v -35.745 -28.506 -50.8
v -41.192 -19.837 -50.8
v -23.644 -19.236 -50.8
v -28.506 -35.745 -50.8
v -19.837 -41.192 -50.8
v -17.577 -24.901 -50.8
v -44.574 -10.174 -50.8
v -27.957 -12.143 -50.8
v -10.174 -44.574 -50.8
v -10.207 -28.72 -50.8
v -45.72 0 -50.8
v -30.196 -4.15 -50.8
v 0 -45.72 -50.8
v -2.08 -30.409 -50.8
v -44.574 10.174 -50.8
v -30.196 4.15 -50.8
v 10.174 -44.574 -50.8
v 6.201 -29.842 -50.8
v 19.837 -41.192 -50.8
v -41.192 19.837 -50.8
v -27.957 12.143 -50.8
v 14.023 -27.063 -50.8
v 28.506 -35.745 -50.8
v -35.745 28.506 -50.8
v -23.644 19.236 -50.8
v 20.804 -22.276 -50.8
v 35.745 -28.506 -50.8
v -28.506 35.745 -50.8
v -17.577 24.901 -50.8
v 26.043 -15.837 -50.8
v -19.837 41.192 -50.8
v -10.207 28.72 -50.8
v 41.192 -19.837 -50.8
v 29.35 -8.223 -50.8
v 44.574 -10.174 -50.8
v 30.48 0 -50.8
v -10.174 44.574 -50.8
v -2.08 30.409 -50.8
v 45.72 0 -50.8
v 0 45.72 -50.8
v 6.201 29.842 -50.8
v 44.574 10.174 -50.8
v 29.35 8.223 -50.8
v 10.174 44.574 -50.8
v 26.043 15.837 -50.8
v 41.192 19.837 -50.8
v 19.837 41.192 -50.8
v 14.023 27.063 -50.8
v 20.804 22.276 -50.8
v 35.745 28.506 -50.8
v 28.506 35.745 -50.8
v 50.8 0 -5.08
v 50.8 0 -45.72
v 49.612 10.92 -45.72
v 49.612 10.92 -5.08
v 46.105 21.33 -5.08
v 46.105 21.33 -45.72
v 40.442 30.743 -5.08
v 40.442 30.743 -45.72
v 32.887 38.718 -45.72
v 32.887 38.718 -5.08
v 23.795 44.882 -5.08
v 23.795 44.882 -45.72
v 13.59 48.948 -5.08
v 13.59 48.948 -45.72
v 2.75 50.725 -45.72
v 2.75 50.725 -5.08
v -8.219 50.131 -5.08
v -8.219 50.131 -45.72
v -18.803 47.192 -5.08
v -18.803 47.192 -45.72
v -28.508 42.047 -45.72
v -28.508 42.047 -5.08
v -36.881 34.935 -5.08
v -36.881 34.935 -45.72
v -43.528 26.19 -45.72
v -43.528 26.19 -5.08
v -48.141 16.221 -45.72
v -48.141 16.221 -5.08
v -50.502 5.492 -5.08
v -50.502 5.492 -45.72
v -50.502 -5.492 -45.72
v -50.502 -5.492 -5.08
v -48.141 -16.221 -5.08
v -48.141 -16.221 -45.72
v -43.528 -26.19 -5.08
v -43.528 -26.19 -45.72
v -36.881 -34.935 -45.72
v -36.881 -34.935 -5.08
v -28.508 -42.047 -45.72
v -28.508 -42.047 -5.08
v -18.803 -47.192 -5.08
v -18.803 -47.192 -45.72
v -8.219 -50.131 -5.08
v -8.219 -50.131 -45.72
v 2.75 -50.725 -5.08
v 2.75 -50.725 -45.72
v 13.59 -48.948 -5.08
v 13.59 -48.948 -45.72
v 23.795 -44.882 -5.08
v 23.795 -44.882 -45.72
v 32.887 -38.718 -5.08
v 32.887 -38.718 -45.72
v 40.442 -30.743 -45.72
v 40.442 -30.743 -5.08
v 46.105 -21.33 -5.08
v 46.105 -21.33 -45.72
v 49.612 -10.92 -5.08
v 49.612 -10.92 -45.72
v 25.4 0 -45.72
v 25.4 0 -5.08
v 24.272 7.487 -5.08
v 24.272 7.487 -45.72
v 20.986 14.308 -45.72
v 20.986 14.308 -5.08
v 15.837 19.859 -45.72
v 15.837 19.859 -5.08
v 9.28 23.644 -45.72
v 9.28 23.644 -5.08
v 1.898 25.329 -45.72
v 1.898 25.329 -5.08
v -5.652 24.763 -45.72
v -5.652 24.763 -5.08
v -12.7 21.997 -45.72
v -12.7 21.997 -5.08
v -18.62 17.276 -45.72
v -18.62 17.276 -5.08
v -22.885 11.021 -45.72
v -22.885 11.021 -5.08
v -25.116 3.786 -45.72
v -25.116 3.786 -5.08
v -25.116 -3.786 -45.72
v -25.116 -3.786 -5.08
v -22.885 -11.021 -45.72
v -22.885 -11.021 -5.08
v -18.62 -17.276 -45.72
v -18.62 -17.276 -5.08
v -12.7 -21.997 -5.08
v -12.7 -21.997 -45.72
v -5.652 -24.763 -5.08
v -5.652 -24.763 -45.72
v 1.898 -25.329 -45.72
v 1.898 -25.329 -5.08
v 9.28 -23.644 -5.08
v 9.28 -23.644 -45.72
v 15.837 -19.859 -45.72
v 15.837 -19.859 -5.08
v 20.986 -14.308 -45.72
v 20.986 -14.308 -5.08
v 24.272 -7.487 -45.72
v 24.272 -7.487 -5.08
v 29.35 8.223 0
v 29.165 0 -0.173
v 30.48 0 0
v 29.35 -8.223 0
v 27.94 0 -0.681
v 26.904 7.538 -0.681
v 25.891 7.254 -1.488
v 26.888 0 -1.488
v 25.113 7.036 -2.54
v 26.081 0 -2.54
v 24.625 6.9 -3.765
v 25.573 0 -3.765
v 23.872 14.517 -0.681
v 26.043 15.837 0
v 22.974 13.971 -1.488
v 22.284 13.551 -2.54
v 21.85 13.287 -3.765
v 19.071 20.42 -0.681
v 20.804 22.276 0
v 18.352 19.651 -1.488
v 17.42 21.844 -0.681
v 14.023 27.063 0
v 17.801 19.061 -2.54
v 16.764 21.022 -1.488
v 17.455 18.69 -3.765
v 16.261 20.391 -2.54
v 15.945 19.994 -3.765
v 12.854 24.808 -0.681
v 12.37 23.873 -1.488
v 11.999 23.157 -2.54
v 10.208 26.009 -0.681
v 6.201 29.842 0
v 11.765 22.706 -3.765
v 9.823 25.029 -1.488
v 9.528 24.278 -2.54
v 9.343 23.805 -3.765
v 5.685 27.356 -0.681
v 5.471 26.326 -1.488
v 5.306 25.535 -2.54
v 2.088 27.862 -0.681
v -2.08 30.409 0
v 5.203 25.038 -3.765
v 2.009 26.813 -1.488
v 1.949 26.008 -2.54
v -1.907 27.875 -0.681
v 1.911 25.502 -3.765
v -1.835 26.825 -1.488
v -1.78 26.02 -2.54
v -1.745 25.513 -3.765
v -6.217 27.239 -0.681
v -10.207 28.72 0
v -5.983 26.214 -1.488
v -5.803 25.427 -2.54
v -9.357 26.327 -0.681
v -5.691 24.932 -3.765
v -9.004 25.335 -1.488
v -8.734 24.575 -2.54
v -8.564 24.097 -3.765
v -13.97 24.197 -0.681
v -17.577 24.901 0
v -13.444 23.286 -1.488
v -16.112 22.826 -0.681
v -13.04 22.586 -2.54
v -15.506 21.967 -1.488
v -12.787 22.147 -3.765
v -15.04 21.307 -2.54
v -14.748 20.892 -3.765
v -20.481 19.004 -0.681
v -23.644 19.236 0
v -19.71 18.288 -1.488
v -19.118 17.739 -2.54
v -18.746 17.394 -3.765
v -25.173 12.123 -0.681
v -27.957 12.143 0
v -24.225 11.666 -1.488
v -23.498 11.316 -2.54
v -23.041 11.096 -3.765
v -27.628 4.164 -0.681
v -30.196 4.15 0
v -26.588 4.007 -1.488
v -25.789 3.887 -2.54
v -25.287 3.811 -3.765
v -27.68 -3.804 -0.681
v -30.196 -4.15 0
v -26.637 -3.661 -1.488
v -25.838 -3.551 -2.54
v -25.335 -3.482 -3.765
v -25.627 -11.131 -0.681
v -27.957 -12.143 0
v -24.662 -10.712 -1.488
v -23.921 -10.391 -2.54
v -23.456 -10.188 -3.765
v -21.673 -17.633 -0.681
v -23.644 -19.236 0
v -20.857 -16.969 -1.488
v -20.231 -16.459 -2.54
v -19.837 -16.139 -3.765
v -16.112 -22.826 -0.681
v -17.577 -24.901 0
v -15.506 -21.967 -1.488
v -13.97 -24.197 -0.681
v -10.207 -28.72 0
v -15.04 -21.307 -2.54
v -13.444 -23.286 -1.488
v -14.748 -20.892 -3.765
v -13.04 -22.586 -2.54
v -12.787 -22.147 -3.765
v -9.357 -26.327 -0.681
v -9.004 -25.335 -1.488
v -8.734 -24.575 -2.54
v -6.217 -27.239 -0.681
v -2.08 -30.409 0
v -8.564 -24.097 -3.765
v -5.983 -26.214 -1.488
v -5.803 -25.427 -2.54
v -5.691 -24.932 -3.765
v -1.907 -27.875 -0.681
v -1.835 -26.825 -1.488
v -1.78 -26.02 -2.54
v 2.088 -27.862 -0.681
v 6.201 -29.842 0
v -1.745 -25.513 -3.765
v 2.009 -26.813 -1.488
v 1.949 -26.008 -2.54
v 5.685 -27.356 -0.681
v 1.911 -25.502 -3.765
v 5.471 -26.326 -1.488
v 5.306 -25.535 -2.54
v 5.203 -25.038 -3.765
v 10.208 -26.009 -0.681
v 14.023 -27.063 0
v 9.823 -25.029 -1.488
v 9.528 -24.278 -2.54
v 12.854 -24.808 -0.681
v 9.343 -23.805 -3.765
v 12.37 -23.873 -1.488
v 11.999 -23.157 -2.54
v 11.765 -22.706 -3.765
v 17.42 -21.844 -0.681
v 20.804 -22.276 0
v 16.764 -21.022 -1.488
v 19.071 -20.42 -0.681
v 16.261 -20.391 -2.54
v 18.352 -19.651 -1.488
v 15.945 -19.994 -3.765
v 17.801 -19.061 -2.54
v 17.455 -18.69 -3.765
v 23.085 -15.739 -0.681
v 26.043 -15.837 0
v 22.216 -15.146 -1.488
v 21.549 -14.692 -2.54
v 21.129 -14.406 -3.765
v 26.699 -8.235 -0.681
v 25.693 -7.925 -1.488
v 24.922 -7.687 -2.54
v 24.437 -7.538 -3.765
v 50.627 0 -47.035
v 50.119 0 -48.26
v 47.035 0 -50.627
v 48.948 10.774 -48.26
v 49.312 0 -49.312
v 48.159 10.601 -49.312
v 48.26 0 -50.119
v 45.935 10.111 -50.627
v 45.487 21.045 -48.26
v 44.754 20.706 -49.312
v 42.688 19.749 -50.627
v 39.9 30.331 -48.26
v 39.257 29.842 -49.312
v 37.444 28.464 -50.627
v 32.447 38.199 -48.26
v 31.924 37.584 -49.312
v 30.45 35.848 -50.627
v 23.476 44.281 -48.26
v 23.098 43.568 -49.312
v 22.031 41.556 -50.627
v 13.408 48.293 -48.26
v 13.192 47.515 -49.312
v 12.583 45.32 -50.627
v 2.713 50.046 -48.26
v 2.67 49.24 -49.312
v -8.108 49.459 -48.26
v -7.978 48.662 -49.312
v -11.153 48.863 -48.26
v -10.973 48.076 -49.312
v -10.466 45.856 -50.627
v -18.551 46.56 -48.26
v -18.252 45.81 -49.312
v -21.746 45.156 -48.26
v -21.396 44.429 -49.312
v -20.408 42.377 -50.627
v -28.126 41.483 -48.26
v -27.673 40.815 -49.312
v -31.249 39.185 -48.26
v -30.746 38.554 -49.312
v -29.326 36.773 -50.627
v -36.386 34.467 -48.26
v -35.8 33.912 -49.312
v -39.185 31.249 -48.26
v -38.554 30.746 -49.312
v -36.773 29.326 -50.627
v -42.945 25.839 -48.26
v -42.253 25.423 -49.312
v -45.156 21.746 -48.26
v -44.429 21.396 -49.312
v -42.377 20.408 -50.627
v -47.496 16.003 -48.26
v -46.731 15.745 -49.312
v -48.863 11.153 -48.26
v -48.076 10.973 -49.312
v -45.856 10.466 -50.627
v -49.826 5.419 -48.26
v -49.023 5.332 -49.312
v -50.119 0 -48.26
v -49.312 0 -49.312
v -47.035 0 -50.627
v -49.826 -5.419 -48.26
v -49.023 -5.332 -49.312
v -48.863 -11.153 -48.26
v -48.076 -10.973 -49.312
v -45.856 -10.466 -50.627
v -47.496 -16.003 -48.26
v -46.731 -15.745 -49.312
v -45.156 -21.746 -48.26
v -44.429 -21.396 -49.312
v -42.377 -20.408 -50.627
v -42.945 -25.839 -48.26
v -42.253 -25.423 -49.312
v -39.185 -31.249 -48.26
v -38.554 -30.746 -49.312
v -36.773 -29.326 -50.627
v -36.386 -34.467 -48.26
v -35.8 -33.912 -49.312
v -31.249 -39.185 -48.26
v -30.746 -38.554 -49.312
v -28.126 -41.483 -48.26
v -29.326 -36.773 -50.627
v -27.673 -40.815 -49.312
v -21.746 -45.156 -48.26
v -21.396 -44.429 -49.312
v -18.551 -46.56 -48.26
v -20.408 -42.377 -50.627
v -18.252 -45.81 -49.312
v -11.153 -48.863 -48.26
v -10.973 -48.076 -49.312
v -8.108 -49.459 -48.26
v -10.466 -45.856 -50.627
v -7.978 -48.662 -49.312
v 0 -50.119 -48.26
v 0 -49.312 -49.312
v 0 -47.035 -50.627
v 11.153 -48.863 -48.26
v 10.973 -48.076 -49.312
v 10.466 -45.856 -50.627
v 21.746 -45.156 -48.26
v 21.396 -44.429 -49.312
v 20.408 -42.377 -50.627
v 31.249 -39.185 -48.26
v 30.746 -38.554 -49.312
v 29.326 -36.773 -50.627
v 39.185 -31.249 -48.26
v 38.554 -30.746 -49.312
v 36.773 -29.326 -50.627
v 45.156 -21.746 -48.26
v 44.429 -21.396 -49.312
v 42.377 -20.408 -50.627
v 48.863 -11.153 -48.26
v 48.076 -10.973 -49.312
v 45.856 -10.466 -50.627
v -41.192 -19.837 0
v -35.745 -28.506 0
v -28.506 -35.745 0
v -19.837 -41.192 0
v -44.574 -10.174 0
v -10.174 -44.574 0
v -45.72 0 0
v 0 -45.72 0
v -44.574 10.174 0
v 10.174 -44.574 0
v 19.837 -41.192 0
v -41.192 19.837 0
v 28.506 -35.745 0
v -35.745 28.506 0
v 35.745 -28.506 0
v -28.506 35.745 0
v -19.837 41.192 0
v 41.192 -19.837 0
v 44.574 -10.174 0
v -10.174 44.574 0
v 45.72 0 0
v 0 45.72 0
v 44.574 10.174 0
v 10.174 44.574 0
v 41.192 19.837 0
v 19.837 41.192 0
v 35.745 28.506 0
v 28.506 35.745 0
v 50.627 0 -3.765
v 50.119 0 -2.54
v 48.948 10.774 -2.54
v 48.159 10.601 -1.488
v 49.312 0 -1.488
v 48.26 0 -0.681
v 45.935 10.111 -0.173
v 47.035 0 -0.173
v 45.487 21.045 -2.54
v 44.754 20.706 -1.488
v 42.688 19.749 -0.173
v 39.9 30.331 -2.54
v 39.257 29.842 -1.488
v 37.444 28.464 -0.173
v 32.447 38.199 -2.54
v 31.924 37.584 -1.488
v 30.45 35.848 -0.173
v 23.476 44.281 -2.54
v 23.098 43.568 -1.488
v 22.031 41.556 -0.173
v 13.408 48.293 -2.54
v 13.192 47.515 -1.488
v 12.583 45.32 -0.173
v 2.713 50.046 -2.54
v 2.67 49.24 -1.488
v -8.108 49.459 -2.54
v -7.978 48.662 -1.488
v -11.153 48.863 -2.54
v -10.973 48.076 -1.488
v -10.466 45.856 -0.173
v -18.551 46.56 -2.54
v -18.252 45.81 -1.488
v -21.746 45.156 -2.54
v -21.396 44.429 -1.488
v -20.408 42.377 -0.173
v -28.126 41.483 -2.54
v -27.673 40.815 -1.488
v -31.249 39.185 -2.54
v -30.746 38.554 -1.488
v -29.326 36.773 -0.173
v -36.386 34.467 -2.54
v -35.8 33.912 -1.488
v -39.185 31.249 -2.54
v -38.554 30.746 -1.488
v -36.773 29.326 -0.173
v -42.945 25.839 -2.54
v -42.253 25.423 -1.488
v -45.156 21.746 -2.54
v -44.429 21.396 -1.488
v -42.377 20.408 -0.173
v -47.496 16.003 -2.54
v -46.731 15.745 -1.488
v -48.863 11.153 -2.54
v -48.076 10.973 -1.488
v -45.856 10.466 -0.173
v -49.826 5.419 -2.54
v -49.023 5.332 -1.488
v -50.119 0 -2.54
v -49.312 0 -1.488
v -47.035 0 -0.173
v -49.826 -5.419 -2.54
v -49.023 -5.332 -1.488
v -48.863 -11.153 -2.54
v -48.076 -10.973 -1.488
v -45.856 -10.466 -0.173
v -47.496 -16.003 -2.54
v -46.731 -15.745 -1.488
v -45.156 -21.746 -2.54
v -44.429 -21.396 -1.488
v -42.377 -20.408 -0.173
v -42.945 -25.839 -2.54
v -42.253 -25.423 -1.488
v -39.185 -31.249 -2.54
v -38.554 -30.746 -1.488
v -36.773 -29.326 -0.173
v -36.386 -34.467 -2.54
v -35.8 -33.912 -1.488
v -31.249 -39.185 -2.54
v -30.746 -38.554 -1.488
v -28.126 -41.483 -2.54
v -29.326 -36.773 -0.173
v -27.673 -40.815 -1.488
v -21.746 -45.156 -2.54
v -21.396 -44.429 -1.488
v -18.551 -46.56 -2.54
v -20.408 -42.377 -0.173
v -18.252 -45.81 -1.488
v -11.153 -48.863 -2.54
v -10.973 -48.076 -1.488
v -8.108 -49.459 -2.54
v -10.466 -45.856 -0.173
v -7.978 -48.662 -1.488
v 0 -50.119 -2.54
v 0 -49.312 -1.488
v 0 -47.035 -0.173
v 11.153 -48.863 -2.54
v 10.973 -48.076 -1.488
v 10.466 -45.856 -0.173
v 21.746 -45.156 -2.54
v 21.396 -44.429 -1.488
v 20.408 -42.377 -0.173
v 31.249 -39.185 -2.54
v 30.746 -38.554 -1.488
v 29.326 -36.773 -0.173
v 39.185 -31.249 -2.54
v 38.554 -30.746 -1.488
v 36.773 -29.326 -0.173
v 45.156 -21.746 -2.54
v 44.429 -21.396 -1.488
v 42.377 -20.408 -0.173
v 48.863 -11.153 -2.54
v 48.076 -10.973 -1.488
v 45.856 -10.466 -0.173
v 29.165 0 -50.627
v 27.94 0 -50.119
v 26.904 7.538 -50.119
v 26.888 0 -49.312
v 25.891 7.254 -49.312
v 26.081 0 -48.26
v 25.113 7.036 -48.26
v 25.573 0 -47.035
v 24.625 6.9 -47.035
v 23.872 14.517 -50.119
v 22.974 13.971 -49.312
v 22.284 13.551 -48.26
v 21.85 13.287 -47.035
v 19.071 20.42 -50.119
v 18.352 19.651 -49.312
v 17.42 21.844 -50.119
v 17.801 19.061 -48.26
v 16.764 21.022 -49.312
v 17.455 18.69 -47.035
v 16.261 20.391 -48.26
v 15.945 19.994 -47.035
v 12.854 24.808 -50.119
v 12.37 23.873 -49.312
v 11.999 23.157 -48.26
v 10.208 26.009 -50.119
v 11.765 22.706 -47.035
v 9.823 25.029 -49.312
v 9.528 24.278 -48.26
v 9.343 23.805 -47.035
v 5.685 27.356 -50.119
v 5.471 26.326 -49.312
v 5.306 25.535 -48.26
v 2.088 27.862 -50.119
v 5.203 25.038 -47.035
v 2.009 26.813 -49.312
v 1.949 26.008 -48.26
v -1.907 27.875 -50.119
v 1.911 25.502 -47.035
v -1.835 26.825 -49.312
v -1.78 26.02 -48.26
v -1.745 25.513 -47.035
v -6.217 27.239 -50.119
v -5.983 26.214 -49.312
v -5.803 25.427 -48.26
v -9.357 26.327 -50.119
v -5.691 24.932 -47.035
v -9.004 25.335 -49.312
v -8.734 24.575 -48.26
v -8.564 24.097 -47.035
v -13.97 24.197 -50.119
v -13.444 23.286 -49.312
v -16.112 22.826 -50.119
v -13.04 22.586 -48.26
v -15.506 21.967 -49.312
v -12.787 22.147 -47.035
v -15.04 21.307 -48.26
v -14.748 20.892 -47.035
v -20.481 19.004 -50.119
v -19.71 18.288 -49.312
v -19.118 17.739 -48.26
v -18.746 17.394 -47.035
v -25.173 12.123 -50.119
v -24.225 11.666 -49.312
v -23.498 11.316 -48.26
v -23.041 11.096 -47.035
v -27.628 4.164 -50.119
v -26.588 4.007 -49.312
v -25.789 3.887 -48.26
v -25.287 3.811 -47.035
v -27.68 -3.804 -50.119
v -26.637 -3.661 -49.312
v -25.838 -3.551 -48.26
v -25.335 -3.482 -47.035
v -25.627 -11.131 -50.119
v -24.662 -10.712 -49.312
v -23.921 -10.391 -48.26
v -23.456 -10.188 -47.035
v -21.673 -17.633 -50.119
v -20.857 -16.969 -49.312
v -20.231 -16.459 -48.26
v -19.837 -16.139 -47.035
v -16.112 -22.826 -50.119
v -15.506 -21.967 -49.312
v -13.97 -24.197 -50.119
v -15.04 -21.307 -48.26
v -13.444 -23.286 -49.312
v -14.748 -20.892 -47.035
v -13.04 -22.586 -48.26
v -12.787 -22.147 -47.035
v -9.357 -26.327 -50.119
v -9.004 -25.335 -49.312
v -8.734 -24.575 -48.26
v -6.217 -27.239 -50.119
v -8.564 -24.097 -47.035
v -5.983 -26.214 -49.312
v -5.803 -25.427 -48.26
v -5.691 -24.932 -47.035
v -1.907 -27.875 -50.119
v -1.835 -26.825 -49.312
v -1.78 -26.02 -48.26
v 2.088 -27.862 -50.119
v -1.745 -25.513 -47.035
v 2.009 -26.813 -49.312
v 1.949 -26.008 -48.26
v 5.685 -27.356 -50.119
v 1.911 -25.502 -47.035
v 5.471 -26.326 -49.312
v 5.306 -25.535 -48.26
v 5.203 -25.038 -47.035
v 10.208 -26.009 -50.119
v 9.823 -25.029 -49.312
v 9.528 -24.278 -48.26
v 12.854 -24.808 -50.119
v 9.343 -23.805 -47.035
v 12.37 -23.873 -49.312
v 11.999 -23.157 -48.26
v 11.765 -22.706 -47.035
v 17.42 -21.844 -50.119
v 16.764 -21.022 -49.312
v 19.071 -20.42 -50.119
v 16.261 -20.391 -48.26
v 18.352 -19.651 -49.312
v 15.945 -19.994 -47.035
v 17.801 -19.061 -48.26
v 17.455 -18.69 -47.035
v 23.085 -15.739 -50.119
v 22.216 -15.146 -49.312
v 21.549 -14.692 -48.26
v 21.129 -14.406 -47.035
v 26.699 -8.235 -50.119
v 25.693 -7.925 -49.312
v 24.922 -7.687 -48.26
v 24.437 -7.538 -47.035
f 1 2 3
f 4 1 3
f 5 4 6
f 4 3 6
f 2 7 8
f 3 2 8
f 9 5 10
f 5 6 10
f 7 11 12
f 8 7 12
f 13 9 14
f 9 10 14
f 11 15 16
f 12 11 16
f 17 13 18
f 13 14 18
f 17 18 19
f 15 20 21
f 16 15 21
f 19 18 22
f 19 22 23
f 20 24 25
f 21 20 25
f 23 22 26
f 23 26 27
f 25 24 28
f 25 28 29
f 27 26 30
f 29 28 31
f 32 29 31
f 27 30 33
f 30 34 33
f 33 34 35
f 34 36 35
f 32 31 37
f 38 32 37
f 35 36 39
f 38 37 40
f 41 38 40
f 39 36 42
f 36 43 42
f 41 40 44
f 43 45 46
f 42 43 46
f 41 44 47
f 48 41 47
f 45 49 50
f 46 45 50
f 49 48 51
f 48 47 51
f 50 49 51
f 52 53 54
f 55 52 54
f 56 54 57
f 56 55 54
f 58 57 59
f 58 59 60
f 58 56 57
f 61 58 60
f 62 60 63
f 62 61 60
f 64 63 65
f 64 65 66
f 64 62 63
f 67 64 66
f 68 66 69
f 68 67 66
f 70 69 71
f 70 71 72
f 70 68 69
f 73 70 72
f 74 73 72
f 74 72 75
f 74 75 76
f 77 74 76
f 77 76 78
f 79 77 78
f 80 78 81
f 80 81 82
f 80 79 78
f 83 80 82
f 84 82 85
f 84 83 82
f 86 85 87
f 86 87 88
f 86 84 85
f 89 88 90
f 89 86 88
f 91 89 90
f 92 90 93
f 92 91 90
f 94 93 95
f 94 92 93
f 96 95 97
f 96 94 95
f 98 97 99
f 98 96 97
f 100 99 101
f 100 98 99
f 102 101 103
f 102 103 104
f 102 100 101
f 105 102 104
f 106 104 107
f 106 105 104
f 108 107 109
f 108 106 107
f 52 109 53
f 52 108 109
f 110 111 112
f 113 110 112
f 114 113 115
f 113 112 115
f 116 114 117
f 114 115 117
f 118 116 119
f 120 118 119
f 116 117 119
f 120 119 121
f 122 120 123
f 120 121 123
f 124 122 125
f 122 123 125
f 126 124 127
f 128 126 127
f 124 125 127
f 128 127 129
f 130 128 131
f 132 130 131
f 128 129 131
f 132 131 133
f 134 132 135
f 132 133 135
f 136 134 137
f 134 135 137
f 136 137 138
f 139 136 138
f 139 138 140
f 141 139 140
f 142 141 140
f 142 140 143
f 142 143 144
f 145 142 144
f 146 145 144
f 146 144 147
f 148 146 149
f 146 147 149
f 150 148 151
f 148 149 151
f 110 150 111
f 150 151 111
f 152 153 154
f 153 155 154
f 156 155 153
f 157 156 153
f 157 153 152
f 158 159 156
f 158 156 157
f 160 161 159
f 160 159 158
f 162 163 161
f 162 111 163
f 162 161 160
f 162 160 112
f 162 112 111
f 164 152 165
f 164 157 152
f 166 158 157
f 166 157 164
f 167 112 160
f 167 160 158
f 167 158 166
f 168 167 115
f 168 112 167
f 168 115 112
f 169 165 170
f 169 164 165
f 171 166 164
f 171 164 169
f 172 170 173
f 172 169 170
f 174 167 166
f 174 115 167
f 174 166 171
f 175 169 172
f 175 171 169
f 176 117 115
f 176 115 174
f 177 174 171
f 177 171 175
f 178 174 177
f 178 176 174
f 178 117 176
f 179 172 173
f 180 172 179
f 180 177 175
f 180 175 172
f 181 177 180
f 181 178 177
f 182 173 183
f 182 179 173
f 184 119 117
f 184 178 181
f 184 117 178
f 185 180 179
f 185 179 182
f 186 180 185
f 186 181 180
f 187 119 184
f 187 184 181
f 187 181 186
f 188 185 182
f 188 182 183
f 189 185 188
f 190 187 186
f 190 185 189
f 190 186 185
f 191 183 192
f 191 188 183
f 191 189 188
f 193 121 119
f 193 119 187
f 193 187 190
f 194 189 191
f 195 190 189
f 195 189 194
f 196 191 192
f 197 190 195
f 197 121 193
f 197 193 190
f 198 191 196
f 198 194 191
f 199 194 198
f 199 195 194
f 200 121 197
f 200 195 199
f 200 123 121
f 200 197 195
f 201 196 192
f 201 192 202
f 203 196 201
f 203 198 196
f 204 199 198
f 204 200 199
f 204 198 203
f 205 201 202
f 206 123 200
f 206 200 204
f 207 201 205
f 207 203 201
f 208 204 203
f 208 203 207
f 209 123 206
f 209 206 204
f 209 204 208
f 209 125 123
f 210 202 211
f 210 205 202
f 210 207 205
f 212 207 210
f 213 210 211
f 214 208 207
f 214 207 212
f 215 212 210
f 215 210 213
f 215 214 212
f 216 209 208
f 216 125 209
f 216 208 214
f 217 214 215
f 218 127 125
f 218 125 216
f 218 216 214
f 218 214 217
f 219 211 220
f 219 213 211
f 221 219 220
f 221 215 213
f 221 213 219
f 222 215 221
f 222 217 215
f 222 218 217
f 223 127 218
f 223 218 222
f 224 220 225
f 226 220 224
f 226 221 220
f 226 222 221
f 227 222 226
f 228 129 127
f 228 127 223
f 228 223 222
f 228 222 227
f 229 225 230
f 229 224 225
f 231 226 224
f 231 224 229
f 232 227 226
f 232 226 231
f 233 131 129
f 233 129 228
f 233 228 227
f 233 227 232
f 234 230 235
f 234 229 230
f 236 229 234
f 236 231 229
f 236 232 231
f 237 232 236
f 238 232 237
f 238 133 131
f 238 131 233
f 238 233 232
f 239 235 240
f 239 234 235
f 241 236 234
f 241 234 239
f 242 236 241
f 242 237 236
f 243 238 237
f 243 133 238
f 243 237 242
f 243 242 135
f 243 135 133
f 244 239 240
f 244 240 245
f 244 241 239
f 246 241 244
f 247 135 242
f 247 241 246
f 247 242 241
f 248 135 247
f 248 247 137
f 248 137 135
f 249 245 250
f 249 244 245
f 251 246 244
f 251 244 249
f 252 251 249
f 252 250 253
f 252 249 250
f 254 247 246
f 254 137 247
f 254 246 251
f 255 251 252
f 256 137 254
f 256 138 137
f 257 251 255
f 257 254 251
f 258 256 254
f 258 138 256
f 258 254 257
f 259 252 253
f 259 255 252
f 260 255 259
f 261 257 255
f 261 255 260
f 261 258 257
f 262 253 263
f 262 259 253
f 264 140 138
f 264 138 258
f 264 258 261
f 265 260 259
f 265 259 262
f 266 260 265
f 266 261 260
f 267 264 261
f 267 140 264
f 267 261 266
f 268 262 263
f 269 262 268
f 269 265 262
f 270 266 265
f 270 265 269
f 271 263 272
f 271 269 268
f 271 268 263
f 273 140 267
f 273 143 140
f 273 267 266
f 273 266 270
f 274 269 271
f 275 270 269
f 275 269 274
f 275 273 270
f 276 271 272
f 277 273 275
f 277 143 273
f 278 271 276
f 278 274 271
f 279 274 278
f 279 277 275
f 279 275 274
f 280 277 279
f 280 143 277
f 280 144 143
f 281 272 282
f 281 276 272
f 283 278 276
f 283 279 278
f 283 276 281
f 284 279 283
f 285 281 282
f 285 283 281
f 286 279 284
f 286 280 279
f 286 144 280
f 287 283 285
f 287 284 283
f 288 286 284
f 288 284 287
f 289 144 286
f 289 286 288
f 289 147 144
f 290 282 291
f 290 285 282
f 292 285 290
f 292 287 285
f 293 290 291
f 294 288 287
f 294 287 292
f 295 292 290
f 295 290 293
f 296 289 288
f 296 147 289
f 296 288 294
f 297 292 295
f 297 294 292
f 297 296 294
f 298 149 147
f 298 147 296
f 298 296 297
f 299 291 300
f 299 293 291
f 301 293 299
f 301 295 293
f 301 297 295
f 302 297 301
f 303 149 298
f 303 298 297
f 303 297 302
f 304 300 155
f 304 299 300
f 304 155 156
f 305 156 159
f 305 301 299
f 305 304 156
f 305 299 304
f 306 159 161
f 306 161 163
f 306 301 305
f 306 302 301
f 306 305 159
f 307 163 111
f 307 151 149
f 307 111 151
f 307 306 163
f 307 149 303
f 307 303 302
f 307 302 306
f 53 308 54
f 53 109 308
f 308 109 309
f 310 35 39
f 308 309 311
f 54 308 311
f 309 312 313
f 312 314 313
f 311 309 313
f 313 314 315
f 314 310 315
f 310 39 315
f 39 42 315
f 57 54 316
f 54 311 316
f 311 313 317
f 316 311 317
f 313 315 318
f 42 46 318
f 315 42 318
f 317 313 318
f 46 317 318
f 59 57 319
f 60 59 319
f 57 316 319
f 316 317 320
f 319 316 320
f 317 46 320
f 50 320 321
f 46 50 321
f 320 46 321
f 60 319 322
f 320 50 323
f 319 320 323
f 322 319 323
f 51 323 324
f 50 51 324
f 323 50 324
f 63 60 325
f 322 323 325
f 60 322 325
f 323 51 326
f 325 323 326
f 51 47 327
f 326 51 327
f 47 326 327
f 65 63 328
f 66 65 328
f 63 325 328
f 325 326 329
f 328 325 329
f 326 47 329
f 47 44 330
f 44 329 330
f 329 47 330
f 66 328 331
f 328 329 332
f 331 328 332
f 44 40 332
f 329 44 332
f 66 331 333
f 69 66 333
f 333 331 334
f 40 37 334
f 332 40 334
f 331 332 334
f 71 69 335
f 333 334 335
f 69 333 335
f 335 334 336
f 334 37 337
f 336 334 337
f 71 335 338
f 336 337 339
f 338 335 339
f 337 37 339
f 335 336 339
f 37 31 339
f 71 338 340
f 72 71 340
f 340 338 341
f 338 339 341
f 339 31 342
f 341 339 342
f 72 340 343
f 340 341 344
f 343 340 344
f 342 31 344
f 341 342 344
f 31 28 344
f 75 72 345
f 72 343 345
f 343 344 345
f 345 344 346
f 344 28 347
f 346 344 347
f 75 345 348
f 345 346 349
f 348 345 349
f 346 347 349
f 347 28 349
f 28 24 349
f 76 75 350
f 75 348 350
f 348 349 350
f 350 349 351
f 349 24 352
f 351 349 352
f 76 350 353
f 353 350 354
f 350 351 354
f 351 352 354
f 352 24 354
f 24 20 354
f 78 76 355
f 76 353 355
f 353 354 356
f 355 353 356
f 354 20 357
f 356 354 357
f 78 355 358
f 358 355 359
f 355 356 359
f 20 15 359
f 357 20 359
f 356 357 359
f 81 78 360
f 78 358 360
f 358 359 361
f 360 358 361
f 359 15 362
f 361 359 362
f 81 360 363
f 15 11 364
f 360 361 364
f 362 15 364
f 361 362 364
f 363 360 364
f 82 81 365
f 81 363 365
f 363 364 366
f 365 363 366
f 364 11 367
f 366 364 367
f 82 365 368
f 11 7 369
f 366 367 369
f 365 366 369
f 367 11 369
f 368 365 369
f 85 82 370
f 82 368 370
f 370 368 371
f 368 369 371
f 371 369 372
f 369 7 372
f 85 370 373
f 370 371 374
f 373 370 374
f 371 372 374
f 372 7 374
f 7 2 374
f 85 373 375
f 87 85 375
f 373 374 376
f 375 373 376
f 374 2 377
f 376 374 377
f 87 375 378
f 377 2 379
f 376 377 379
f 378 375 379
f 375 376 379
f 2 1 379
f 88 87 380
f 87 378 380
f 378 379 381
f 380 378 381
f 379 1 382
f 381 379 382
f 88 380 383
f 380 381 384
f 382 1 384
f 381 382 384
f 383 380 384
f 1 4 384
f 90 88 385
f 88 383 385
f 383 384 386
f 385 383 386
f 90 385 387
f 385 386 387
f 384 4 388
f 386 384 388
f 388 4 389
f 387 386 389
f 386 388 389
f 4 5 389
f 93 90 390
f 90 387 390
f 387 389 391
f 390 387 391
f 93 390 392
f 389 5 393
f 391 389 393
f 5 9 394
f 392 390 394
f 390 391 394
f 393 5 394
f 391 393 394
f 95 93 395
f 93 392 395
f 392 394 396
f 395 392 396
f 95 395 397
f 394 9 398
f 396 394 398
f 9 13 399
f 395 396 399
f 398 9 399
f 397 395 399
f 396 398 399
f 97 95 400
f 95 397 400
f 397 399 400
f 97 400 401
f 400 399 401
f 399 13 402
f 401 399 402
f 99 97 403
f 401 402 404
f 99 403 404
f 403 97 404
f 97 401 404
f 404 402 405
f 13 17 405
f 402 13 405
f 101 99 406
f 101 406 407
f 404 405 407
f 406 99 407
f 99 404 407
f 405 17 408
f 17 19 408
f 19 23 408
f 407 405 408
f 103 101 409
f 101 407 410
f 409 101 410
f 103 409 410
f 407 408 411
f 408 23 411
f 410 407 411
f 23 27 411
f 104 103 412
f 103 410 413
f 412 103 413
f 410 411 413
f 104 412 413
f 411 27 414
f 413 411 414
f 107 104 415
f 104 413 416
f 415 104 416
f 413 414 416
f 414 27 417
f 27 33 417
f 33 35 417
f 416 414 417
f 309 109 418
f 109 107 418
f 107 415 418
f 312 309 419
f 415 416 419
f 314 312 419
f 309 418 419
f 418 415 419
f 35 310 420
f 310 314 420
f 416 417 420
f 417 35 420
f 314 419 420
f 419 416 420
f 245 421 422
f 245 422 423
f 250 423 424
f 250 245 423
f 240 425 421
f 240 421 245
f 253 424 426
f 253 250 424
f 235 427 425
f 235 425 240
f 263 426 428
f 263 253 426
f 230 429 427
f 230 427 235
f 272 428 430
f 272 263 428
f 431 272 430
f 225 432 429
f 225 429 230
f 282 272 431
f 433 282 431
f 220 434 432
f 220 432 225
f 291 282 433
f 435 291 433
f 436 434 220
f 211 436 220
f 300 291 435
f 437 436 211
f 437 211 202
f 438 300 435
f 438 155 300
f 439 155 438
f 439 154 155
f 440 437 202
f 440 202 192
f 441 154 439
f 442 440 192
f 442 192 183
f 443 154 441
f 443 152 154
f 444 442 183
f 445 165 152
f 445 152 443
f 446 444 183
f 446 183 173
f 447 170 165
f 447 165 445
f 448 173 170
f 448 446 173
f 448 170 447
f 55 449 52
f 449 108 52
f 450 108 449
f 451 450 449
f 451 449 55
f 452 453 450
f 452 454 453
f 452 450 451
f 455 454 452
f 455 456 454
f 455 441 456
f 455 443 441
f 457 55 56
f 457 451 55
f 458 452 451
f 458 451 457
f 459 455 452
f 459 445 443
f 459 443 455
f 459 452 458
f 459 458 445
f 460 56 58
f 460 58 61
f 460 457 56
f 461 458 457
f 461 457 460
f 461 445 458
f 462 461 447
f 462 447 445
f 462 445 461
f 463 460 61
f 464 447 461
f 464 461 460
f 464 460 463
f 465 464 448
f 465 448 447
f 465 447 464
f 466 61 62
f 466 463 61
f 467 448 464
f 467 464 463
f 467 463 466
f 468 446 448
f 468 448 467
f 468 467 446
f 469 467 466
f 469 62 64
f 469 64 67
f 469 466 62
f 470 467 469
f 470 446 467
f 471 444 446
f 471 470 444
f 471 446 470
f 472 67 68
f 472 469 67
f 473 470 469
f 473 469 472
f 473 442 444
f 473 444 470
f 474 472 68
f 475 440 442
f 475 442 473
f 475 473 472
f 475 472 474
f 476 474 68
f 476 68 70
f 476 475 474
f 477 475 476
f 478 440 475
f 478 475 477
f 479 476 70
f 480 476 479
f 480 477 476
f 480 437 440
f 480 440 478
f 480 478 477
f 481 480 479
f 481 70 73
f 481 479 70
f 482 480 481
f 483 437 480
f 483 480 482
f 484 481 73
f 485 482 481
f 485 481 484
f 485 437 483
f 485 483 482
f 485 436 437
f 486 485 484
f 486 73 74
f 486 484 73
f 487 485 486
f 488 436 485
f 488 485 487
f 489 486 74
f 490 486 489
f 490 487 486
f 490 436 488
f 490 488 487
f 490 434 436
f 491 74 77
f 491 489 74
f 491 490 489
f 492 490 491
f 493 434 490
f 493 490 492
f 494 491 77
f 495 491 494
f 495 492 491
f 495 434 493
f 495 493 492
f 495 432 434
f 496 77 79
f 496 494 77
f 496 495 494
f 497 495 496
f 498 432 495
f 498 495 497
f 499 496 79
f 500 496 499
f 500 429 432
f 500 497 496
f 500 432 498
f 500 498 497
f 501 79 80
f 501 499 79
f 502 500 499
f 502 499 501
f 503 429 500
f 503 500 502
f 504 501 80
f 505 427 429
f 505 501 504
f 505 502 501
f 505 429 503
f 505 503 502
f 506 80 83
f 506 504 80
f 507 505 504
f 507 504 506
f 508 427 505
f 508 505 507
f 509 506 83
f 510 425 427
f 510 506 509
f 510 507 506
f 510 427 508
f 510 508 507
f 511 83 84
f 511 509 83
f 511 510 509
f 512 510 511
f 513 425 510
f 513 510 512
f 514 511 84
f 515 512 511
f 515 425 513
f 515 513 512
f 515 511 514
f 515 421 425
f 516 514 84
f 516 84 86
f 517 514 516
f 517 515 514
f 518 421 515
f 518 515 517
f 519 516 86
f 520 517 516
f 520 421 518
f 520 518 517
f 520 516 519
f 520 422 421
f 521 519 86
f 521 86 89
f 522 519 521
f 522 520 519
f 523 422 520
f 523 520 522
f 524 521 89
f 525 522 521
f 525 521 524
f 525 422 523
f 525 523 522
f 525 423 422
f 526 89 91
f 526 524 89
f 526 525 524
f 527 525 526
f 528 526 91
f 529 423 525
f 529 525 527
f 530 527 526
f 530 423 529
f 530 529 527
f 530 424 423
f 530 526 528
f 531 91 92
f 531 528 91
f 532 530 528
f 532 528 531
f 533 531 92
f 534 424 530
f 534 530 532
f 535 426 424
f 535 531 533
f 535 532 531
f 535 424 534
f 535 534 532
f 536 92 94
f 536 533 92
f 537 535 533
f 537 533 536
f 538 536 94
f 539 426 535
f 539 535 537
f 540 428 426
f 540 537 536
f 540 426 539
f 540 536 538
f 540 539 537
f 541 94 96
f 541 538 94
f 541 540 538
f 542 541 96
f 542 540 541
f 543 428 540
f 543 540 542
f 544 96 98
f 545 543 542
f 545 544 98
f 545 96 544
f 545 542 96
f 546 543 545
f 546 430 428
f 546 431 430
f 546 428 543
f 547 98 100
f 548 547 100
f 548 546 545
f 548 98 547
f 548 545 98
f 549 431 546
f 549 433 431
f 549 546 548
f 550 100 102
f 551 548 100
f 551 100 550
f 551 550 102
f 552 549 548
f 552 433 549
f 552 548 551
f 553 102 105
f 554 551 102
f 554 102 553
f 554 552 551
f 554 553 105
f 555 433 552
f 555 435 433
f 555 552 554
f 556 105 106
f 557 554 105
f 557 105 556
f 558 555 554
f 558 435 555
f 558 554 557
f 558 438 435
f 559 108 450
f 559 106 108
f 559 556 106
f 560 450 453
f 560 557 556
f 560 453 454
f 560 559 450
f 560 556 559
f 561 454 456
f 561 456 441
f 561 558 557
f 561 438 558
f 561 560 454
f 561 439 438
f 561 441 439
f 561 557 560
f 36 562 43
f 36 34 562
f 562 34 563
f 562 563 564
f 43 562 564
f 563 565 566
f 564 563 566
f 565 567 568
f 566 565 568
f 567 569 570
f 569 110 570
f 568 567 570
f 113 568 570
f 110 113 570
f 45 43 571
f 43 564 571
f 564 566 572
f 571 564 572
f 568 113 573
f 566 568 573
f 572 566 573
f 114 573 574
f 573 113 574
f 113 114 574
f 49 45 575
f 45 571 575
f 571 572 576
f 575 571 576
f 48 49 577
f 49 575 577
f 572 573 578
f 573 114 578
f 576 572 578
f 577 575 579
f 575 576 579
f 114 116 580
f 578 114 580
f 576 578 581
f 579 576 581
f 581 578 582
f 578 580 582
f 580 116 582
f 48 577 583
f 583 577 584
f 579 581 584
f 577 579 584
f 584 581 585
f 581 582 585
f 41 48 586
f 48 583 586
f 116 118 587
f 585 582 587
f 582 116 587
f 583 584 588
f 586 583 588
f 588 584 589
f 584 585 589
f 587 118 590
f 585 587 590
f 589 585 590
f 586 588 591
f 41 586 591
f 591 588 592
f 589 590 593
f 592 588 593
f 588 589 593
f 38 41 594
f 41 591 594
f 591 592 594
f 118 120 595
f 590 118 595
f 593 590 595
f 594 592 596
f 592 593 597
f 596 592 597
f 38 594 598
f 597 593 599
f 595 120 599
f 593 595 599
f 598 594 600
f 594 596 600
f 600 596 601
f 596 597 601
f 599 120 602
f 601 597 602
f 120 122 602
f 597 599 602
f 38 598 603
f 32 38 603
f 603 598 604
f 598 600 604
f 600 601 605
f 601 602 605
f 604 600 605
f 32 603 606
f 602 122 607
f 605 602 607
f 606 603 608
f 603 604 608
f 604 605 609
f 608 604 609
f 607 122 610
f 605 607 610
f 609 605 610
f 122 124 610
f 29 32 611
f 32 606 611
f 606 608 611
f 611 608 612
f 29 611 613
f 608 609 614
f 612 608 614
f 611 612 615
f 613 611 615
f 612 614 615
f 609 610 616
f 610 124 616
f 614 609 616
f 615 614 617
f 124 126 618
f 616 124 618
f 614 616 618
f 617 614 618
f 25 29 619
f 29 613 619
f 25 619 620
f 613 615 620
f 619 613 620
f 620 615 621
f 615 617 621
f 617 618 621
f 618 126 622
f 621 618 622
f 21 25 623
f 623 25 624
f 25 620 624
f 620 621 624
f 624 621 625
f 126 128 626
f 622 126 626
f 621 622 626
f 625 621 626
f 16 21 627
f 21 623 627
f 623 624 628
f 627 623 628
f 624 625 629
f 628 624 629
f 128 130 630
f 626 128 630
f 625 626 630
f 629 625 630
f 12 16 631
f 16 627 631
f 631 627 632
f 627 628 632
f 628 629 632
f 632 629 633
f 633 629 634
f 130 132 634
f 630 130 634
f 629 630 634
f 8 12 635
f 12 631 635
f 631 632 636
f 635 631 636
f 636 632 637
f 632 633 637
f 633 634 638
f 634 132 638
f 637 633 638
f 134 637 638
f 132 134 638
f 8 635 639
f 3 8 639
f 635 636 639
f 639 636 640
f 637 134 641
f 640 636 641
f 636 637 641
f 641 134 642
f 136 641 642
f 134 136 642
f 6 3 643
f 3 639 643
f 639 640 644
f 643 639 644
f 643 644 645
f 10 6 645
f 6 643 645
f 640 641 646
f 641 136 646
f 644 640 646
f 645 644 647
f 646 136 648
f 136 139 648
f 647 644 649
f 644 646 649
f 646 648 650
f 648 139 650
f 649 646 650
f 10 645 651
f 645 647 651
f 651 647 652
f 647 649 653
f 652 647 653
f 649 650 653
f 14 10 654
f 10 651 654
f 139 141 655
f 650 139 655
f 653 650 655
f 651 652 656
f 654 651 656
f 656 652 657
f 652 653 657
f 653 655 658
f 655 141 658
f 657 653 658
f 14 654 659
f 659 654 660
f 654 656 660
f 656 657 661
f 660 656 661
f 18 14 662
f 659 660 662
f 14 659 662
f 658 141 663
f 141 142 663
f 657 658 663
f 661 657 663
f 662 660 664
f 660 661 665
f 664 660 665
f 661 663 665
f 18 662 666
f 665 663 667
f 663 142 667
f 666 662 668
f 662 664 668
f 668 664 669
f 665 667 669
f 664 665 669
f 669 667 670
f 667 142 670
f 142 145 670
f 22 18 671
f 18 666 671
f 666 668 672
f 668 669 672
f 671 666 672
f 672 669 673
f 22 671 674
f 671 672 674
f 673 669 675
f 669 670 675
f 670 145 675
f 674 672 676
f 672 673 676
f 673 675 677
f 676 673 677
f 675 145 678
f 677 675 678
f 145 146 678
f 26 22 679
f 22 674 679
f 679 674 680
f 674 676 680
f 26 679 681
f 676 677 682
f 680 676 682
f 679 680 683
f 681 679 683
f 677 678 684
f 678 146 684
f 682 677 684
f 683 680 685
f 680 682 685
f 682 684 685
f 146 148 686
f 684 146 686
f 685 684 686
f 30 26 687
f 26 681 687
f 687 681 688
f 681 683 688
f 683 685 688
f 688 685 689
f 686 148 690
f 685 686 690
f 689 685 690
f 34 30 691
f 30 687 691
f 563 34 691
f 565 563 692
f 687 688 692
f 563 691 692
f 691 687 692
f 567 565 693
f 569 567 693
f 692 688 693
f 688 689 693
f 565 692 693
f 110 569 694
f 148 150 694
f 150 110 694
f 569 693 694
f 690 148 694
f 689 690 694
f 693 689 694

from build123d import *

# Parameters (mm, degrees)
F0_R     = 50.8
F1_DEPTH = 50.8
F2_R     = 25.4
F3_DEPTH = 50.8
F4_R     = 5.08
F5_R     = 5.08


with BuildPart() as f1:
    # F0 (on Top) → F1 (new body)
    with BuildSketch(Plane.XY):
        Circle(F0_R)
    extrude(amount=-F1_DEPTH)

    # F2 (on Top) → F3 (cut)
    with BuildSketch(Plane.XY):
        Circle(F2_R)
    extrude(amount=-F3_DEPTH, mode=Mode.SUBTRACT)

    # F4
    f4_edges = [f1.edges().sort_by_distance(p)[0] for p in [
        (-50.8, 0, 0),
        (-25.4, 0, 0),
    ]]
    fillet(f4_edges, radius=F4_R)

    # F5
    f5_edges = [f1.edges().sort_by_distance(p)[0] for p in [
        (-50.8, 0, -50.8),
        (-25.4, 0, -50.8),
    ]]
    fillet(f5_edges, radius=F5_R)


solid = f1.part
